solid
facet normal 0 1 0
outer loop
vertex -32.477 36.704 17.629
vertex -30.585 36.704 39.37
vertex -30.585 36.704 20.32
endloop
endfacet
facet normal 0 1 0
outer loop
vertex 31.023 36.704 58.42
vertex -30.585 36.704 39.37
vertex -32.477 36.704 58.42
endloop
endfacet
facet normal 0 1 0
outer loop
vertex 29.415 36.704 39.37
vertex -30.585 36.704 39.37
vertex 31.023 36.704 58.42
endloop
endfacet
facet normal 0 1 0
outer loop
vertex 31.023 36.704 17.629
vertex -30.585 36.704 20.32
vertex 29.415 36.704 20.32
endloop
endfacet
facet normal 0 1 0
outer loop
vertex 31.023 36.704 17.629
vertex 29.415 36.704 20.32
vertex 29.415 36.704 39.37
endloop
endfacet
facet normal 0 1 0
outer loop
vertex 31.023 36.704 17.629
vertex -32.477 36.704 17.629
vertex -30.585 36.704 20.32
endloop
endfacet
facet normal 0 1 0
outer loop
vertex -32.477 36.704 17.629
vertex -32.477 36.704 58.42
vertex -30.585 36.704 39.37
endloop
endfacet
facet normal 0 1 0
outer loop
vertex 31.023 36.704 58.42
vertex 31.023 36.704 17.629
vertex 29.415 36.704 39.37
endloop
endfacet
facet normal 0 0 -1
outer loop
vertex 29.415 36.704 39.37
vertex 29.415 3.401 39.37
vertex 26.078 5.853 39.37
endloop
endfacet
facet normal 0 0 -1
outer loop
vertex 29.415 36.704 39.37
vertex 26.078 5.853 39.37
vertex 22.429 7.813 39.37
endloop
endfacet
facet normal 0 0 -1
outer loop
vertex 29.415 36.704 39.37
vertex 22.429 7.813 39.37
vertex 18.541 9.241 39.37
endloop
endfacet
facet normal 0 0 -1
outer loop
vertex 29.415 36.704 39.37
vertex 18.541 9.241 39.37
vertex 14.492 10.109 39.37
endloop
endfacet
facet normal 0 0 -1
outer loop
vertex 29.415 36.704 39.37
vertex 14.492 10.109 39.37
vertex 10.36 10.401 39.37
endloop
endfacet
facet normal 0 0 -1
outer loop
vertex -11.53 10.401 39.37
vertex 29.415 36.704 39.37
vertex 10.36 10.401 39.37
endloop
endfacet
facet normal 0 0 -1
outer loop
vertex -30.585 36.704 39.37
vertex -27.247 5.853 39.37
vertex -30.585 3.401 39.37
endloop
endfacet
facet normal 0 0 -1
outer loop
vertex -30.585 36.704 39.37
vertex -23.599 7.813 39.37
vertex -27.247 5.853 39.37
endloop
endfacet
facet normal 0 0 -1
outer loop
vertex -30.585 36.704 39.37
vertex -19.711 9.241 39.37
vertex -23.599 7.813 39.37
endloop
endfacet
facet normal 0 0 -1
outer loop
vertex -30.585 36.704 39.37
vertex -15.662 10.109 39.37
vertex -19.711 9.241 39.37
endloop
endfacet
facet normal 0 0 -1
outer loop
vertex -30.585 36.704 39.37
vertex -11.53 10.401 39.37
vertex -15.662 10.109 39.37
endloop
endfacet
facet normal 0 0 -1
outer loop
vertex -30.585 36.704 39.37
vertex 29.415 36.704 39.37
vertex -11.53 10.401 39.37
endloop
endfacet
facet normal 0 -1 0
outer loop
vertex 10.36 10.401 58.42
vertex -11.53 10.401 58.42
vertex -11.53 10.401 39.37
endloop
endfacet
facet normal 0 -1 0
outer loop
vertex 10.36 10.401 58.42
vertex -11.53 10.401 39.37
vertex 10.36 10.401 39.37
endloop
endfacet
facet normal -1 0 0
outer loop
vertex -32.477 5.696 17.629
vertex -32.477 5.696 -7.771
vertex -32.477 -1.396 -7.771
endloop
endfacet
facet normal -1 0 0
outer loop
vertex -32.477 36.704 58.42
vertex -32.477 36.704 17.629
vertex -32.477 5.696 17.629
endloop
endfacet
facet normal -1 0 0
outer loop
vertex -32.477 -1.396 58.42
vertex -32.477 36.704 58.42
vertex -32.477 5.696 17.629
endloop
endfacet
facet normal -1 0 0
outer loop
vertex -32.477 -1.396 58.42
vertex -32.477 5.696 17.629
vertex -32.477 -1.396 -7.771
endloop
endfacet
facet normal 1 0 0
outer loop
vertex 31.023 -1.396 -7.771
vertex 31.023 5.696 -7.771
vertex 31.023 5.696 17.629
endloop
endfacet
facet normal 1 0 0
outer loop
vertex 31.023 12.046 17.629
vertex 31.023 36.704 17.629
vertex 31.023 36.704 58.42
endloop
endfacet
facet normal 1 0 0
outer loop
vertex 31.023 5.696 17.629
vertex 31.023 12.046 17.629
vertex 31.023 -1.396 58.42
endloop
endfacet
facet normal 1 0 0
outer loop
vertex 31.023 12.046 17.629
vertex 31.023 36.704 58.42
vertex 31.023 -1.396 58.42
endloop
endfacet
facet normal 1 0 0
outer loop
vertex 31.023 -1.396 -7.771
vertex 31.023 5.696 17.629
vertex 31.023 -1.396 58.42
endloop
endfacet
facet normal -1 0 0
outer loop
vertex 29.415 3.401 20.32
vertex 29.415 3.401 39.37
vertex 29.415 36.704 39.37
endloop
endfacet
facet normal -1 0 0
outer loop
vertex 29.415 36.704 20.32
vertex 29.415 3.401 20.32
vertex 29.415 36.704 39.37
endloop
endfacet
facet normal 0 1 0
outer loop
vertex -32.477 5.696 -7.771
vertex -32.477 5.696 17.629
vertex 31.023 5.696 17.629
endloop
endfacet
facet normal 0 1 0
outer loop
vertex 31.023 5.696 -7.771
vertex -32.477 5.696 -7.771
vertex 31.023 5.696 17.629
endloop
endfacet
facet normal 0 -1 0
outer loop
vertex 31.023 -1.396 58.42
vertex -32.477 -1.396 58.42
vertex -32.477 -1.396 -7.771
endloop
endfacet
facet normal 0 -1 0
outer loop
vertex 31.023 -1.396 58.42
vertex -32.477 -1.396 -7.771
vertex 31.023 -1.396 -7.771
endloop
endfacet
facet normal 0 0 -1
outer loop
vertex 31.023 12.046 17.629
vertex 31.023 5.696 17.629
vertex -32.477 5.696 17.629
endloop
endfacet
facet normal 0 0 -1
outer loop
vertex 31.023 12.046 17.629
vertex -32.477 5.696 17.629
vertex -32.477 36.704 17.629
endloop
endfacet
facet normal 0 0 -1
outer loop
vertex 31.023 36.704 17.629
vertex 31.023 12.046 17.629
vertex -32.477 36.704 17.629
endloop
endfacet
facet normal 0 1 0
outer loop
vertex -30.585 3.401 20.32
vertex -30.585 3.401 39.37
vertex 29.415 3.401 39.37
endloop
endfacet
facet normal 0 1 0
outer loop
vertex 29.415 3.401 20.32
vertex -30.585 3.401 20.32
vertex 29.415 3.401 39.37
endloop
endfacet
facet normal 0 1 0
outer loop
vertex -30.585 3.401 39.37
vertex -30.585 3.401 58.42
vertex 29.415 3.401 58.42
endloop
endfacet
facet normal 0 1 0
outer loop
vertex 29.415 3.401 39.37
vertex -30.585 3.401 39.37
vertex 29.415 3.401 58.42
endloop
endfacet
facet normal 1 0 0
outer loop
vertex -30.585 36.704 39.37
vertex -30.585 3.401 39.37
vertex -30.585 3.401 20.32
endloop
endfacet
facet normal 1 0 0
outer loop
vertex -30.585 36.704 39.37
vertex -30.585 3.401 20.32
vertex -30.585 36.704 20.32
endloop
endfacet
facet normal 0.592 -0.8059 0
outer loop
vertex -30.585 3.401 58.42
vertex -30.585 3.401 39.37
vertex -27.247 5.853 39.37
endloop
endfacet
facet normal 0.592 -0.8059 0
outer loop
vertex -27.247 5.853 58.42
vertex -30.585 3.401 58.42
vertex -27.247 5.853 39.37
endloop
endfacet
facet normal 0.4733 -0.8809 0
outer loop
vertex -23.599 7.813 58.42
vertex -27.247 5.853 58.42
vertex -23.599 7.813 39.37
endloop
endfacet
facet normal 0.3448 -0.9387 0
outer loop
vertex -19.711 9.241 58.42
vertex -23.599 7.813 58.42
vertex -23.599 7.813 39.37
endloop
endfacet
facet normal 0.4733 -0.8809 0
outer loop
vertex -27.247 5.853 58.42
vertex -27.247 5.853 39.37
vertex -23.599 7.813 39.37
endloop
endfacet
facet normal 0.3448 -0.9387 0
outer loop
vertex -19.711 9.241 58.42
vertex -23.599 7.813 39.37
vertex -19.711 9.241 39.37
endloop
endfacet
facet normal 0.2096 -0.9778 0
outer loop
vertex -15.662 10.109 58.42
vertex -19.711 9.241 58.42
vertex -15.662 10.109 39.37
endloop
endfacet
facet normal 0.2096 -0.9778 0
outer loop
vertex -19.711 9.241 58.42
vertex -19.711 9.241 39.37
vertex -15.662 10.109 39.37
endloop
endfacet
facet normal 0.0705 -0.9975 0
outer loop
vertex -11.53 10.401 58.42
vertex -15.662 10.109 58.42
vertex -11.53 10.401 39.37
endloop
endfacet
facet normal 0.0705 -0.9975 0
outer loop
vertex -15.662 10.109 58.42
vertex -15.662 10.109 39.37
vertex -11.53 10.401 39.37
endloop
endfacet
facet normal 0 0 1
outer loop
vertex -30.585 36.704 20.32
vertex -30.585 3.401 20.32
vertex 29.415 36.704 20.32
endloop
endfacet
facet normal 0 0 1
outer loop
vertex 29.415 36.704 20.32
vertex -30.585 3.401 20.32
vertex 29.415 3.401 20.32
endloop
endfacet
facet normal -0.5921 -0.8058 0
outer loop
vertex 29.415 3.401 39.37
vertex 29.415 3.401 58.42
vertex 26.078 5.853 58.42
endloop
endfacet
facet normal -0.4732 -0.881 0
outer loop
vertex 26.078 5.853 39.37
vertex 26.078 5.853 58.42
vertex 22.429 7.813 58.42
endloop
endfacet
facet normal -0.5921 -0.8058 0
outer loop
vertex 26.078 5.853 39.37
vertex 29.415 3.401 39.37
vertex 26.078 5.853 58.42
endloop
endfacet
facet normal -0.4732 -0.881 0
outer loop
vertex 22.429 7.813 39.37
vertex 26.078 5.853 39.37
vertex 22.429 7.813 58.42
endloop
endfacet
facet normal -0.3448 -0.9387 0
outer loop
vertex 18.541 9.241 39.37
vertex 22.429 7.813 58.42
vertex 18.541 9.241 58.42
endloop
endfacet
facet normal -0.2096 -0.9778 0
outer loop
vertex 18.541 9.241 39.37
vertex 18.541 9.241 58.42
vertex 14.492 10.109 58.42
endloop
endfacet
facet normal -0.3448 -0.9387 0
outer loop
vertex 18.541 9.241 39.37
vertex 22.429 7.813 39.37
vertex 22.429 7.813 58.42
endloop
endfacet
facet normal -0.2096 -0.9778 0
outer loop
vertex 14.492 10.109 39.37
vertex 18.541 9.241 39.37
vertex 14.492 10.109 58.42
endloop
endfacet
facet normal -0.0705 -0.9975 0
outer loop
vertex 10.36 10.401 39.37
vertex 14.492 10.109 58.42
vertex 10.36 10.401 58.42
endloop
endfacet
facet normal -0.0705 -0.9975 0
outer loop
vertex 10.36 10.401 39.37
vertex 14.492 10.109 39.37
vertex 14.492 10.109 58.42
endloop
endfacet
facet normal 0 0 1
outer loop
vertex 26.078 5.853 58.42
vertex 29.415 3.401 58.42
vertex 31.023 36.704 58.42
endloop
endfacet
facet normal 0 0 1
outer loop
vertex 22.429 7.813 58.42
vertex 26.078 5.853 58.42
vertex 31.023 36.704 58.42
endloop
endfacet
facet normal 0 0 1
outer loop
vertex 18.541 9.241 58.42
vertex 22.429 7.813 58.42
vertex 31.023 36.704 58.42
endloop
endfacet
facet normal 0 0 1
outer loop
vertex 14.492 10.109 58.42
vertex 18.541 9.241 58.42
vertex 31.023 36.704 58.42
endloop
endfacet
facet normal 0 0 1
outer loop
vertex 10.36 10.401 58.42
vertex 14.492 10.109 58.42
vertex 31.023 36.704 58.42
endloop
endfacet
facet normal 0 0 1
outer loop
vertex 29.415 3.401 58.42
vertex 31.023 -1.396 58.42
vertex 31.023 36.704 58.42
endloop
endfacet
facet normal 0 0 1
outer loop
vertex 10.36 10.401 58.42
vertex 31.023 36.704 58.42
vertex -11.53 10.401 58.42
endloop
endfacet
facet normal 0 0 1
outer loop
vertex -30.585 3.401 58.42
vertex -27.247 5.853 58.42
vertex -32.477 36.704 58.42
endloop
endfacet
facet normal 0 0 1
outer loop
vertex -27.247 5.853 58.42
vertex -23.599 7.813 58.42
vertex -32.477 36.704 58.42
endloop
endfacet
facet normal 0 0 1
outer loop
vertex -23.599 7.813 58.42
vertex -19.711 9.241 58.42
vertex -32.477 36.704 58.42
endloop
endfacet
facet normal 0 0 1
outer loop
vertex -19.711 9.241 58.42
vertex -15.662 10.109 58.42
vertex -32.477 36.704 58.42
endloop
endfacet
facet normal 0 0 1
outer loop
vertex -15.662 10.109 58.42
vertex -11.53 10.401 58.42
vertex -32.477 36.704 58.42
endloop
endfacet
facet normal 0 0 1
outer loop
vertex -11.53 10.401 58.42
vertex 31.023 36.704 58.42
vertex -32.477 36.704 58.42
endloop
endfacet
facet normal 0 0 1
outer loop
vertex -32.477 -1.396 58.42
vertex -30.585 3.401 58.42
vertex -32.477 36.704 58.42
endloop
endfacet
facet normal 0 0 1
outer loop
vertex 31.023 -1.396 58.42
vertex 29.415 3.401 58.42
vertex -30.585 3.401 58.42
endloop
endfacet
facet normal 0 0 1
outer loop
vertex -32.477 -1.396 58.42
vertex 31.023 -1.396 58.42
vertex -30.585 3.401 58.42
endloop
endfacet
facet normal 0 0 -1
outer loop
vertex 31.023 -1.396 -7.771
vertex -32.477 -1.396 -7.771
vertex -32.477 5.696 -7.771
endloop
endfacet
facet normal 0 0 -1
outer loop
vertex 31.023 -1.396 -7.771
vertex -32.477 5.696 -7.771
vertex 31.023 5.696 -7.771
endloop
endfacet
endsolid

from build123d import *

# Parameters (mm, degrees)
F0_W         = 63.5
F0_H         = 63.5
F1_DEPTH     = 38.1
F2_DEPTH     = 58.42
F3_W         = 60
F3_H         = 7
F4_DEPTH     = 38.1
F5_W         = 60
F5_H         = 19.05
F6_DEPTH     = 50.8
F7_DEPTH     = 25.4
F8_W         = 38.1
F8_H         = 17.6288653165
F9_DEPTH     = 76.2
F10_T1_DEPTH = 19.05
F11_W        = 63.5
F11_H        = 13.4413276523
F12_DEPTH    = 25.4
F13_DEPTH    = 6.35


# Not quite as in the source:
# - a fillet or chamfer that OpenCascade refuses, or shapes differently, is made with other operations: its cross-section is extruded or revolved along the edge and cut away or added


with BuildPart() as f1:
    # F0 (on Top) → F1 (new body)
    with BuildSketch(Plane.XY):
        with Locations((-0.7267157435, 4.9544320554)):
            Rectangle(F0_W, F0_H)
    extrude(amount=F1_DEPTH)

    # F0 (on Top) → F2 (join)
    with BuildSketch(Plane.XY):
        with Locations((-0.7267157435, 4.9544320554)):
            Rectangle(F0_W, F0_H)
    extrude(amount=F2_DEPTH)

    # F3 (on face) → F4 (cut)
    with BuildSketch(Plane.XY.offset(58.42)):
        with Locations((-0.5849367008, 6.9008102814)):
            Rectangle(F3_W, F3_H)
    extrude(amount=-F4_DEPTH, mode=Mode.SUBTRACT)

    # F5 (on face) → F6 (cut)
    with BuildSketch(Plane.XZ.offset(-10.4008102814)):
        with Locations((-0.5849367008, 29.845)):
            Rectangle(F5_W, F5_H)
    extrude(amount=-F6_DEPTH, mode=Mode.SUBTRACT)

    # F7 (cut): a face of the model
    f7_faces = [f1.faces().sort_by_distance(p)[0] for p in [
        (-0.7267157435, -26.7955679446, 29.21),
    ]]
    extrude(f7_faces, amount=-F7_DEPTH, mode=Mode.SUBTRACT)

    # F8 (on face) → F9 (cut)
    with BuildSketch(Plane.YZ.offset(31.0232842565)):
        with Locations((17.6544320554, 8.8144326583)):
            Rectangle(F8_W, F8_H)
    extrude(amount=-F9_DEPTH, mode=Mode.SUBTRACT)

    # F10: fillet of radius 29.4340917525 on 2 edges, made by hand

    # F10_s2 → F10_t1 (join)
    with BuildSketch(Plane.XY.offset(39.37)):
        with BuildLine():
            ThreePointArc((29.4150632992, 3.4008102814), (20.5103197353, 8.5954433667), (10.3604763309, 10.4008102814))
            Line((10.3604763309, 10.4008102814), (29.4150632992, 10.4008102814))
            Line((29.4150632992, 10.4008102814), (29.4150632992, 3.4008102814))
        make_face()
        with BuildLine():
            ThreePointArc((-30.5849367008, 3.4008102814), (-21.6801931368, 8.5954433667), (-11.5303497324, 10.4008102814))
            Line((-11.5303497324, 10.4008102814), (-30.5849367008, 10.4008102814))
            Line((-30.5849367008, 10.4008102814), (-30.5849367008, 3.4008102814))
        make_face()
    extrude(amount=F10_T1_DEPTH)

    # F11 (on face) → F12 (join)
    with BuildSketch(Plane(origin=(0, 0, 17.6288653165), x_dir=(1, 0, 0), z_dir=(0, 0, -1))):
        with Locations((-0.7267157435, -5.3250958815)):
            Rectangle(F11_W, F11_H)
    extrude(amount=F12_DEPTH)

    # F13 (cut): a face of the model
    f13_faces = [f1.faces().sort_by_distance(p)[0] for p in [
        (-0.7267157435, 12.0457597077, 4.9288653165),
    ]]
    extrude(f13_faces, amount=-F13_DEPTH, mode=Mode.SUBTRACT)


solid = f1.part
